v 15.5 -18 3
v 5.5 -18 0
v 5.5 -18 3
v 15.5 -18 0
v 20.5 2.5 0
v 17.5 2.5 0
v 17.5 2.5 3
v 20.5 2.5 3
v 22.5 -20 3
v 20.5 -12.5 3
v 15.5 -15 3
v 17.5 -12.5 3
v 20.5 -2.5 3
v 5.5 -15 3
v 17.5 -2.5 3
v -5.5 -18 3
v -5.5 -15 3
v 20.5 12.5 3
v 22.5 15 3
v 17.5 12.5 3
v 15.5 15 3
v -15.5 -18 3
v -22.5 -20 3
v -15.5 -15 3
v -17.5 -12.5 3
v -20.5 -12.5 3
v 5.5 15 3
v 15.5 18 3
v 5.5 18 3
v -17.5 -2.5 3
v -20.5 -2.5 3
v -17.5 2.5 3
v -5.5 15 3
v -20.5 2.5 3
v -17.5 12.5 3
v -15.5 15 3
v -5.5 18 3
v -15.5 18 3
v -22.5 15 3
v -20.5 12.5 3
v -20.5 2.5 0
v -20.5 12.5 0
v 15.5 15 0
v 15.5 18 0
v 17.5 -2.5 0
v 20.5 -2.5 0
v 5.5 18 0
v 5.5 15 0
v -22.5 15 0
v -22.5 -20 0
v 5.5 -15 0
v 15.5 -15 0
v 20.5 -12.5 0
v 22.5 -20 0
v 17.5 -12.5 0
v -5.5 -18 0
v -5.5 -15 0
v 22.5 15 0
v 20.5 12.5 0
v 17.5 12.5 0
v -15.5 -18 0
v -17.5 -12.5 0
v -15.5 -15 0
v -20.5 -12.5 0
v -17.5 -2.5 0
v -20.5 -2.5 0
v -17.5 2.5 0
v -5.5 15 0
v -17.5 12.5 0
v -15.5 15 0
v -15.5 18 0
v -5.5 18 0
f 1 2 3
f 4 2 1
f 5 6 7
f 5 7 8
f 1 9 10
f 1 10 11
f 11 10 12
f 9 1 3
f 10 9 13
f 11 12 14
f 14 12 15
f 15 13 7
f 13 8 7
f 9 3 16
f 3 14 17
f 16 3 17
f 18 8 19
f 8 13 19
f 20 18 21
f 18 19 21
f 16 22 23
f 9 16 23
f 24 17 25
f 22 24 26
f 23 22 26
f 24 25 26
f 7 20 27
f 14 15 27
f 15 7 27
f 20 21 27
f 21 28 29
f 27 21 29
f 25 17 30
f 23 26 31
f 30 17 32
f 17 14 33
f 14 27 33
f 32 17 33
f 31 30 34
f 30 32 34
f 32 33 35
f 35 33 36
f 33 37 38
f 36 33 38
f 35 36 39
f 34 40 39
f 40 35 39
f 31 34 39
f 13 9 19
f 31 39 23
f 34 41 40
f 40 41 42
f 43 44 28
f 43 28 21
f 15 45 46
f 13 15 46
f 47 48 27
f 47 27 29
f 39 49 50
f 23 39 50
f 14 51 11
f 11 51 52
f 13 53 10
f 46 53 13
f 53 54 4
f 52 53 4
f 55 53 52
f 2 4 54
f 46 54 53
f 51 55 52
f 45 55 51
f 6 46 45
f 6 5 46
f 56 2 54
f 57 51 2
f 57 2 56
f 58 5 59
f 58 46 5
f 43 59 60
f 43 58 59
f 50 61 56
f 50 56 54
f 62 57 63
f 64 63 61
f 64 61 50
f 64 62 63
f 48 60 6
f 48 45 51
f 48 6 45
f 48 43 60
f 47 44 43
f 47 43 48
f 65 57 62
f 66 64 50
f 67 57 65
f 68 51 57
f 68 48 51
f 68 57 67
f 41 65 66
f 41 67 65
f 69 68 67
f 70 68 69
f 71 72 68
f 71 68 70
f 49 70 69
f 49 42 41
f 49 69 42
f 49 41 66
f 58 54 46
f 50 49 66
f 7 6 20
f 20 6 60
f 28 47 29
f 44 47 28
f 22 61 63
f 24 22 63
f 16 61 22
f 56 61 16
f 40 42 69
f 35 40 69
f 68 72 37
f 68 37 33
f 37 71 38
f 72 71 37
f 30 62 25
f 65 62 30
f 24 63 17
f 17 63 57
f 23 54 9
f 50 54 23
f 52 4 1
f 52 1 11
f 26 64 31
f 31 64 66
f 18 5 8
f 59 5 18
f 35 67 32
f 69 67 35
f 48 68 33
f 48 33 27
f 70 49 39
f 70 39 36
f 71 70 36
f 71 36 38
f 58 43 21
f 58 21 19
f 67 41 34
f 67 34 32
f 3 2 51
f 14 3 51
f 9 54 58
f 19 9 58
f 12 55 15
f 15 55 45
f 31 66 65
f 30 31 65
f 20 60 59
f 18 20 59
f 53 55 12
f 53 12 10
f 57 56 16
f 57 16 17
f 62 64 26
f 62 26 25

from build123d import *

# Parameters (mm, degrees)
SKETCH_1_W      = 10
SKETCH_1_H      = 3
SKETCH_1_W_2    = 3
SKETCH_1_H_2    = 10
EXTRUDE_1_DEPTH = 3


with BuildPart() as part:
    # 草图1 → 凸台-拉伸1 (new body)
    with BuildSketch(Plane.XY):
        Polygon((-22.5, 15), (-15.5, 15), (-15.5, 18), (-5.5, 18), (-5.5, 15), (5.5, 15), (5.5, 18), (15.5, 18), (15.5, 15), (22.5, 15), (22.5, -15), (22.5, -20), (-22.5, -20), (-22.5, -15), align=None)
        with Locations((-10.5, -16.5)):
            Rectangle(SKETCH_1_W, SKETCH_1_H, mode=Mode.SUBTRACT)
        with Locations((-19, -7.5)):
            Rectangle(SKETCH_1_W_2, SKETCH_1_H_2, mode=Mode.SUBTRACT)
        with Locations((10.5, -16.5)):
            Rectangle(SKETCH_1_W, SKETCH_1_H, mode=Mode.SUBTRACT)
        with Locations((-19, 7.5)):
            Rectangle(SKETCH_1_W_2, SKETCH_1_H_2, mode=Mode.SUBTRACT)
        with Locations((19, -7.5)):
            Rectangle(SKETCH_1_W_2, SKETCH_1_H_2, mode=Mode.SUBTRACT)
        with Locations((19, 7.5)):
            Rectangle(SKETCH_1_W_2, SKETCH_1_H_2, mode=Mode.SUBTRACT)
    extrude(amount=EXTRUDE_1_DEPTH)


solid = part.part
